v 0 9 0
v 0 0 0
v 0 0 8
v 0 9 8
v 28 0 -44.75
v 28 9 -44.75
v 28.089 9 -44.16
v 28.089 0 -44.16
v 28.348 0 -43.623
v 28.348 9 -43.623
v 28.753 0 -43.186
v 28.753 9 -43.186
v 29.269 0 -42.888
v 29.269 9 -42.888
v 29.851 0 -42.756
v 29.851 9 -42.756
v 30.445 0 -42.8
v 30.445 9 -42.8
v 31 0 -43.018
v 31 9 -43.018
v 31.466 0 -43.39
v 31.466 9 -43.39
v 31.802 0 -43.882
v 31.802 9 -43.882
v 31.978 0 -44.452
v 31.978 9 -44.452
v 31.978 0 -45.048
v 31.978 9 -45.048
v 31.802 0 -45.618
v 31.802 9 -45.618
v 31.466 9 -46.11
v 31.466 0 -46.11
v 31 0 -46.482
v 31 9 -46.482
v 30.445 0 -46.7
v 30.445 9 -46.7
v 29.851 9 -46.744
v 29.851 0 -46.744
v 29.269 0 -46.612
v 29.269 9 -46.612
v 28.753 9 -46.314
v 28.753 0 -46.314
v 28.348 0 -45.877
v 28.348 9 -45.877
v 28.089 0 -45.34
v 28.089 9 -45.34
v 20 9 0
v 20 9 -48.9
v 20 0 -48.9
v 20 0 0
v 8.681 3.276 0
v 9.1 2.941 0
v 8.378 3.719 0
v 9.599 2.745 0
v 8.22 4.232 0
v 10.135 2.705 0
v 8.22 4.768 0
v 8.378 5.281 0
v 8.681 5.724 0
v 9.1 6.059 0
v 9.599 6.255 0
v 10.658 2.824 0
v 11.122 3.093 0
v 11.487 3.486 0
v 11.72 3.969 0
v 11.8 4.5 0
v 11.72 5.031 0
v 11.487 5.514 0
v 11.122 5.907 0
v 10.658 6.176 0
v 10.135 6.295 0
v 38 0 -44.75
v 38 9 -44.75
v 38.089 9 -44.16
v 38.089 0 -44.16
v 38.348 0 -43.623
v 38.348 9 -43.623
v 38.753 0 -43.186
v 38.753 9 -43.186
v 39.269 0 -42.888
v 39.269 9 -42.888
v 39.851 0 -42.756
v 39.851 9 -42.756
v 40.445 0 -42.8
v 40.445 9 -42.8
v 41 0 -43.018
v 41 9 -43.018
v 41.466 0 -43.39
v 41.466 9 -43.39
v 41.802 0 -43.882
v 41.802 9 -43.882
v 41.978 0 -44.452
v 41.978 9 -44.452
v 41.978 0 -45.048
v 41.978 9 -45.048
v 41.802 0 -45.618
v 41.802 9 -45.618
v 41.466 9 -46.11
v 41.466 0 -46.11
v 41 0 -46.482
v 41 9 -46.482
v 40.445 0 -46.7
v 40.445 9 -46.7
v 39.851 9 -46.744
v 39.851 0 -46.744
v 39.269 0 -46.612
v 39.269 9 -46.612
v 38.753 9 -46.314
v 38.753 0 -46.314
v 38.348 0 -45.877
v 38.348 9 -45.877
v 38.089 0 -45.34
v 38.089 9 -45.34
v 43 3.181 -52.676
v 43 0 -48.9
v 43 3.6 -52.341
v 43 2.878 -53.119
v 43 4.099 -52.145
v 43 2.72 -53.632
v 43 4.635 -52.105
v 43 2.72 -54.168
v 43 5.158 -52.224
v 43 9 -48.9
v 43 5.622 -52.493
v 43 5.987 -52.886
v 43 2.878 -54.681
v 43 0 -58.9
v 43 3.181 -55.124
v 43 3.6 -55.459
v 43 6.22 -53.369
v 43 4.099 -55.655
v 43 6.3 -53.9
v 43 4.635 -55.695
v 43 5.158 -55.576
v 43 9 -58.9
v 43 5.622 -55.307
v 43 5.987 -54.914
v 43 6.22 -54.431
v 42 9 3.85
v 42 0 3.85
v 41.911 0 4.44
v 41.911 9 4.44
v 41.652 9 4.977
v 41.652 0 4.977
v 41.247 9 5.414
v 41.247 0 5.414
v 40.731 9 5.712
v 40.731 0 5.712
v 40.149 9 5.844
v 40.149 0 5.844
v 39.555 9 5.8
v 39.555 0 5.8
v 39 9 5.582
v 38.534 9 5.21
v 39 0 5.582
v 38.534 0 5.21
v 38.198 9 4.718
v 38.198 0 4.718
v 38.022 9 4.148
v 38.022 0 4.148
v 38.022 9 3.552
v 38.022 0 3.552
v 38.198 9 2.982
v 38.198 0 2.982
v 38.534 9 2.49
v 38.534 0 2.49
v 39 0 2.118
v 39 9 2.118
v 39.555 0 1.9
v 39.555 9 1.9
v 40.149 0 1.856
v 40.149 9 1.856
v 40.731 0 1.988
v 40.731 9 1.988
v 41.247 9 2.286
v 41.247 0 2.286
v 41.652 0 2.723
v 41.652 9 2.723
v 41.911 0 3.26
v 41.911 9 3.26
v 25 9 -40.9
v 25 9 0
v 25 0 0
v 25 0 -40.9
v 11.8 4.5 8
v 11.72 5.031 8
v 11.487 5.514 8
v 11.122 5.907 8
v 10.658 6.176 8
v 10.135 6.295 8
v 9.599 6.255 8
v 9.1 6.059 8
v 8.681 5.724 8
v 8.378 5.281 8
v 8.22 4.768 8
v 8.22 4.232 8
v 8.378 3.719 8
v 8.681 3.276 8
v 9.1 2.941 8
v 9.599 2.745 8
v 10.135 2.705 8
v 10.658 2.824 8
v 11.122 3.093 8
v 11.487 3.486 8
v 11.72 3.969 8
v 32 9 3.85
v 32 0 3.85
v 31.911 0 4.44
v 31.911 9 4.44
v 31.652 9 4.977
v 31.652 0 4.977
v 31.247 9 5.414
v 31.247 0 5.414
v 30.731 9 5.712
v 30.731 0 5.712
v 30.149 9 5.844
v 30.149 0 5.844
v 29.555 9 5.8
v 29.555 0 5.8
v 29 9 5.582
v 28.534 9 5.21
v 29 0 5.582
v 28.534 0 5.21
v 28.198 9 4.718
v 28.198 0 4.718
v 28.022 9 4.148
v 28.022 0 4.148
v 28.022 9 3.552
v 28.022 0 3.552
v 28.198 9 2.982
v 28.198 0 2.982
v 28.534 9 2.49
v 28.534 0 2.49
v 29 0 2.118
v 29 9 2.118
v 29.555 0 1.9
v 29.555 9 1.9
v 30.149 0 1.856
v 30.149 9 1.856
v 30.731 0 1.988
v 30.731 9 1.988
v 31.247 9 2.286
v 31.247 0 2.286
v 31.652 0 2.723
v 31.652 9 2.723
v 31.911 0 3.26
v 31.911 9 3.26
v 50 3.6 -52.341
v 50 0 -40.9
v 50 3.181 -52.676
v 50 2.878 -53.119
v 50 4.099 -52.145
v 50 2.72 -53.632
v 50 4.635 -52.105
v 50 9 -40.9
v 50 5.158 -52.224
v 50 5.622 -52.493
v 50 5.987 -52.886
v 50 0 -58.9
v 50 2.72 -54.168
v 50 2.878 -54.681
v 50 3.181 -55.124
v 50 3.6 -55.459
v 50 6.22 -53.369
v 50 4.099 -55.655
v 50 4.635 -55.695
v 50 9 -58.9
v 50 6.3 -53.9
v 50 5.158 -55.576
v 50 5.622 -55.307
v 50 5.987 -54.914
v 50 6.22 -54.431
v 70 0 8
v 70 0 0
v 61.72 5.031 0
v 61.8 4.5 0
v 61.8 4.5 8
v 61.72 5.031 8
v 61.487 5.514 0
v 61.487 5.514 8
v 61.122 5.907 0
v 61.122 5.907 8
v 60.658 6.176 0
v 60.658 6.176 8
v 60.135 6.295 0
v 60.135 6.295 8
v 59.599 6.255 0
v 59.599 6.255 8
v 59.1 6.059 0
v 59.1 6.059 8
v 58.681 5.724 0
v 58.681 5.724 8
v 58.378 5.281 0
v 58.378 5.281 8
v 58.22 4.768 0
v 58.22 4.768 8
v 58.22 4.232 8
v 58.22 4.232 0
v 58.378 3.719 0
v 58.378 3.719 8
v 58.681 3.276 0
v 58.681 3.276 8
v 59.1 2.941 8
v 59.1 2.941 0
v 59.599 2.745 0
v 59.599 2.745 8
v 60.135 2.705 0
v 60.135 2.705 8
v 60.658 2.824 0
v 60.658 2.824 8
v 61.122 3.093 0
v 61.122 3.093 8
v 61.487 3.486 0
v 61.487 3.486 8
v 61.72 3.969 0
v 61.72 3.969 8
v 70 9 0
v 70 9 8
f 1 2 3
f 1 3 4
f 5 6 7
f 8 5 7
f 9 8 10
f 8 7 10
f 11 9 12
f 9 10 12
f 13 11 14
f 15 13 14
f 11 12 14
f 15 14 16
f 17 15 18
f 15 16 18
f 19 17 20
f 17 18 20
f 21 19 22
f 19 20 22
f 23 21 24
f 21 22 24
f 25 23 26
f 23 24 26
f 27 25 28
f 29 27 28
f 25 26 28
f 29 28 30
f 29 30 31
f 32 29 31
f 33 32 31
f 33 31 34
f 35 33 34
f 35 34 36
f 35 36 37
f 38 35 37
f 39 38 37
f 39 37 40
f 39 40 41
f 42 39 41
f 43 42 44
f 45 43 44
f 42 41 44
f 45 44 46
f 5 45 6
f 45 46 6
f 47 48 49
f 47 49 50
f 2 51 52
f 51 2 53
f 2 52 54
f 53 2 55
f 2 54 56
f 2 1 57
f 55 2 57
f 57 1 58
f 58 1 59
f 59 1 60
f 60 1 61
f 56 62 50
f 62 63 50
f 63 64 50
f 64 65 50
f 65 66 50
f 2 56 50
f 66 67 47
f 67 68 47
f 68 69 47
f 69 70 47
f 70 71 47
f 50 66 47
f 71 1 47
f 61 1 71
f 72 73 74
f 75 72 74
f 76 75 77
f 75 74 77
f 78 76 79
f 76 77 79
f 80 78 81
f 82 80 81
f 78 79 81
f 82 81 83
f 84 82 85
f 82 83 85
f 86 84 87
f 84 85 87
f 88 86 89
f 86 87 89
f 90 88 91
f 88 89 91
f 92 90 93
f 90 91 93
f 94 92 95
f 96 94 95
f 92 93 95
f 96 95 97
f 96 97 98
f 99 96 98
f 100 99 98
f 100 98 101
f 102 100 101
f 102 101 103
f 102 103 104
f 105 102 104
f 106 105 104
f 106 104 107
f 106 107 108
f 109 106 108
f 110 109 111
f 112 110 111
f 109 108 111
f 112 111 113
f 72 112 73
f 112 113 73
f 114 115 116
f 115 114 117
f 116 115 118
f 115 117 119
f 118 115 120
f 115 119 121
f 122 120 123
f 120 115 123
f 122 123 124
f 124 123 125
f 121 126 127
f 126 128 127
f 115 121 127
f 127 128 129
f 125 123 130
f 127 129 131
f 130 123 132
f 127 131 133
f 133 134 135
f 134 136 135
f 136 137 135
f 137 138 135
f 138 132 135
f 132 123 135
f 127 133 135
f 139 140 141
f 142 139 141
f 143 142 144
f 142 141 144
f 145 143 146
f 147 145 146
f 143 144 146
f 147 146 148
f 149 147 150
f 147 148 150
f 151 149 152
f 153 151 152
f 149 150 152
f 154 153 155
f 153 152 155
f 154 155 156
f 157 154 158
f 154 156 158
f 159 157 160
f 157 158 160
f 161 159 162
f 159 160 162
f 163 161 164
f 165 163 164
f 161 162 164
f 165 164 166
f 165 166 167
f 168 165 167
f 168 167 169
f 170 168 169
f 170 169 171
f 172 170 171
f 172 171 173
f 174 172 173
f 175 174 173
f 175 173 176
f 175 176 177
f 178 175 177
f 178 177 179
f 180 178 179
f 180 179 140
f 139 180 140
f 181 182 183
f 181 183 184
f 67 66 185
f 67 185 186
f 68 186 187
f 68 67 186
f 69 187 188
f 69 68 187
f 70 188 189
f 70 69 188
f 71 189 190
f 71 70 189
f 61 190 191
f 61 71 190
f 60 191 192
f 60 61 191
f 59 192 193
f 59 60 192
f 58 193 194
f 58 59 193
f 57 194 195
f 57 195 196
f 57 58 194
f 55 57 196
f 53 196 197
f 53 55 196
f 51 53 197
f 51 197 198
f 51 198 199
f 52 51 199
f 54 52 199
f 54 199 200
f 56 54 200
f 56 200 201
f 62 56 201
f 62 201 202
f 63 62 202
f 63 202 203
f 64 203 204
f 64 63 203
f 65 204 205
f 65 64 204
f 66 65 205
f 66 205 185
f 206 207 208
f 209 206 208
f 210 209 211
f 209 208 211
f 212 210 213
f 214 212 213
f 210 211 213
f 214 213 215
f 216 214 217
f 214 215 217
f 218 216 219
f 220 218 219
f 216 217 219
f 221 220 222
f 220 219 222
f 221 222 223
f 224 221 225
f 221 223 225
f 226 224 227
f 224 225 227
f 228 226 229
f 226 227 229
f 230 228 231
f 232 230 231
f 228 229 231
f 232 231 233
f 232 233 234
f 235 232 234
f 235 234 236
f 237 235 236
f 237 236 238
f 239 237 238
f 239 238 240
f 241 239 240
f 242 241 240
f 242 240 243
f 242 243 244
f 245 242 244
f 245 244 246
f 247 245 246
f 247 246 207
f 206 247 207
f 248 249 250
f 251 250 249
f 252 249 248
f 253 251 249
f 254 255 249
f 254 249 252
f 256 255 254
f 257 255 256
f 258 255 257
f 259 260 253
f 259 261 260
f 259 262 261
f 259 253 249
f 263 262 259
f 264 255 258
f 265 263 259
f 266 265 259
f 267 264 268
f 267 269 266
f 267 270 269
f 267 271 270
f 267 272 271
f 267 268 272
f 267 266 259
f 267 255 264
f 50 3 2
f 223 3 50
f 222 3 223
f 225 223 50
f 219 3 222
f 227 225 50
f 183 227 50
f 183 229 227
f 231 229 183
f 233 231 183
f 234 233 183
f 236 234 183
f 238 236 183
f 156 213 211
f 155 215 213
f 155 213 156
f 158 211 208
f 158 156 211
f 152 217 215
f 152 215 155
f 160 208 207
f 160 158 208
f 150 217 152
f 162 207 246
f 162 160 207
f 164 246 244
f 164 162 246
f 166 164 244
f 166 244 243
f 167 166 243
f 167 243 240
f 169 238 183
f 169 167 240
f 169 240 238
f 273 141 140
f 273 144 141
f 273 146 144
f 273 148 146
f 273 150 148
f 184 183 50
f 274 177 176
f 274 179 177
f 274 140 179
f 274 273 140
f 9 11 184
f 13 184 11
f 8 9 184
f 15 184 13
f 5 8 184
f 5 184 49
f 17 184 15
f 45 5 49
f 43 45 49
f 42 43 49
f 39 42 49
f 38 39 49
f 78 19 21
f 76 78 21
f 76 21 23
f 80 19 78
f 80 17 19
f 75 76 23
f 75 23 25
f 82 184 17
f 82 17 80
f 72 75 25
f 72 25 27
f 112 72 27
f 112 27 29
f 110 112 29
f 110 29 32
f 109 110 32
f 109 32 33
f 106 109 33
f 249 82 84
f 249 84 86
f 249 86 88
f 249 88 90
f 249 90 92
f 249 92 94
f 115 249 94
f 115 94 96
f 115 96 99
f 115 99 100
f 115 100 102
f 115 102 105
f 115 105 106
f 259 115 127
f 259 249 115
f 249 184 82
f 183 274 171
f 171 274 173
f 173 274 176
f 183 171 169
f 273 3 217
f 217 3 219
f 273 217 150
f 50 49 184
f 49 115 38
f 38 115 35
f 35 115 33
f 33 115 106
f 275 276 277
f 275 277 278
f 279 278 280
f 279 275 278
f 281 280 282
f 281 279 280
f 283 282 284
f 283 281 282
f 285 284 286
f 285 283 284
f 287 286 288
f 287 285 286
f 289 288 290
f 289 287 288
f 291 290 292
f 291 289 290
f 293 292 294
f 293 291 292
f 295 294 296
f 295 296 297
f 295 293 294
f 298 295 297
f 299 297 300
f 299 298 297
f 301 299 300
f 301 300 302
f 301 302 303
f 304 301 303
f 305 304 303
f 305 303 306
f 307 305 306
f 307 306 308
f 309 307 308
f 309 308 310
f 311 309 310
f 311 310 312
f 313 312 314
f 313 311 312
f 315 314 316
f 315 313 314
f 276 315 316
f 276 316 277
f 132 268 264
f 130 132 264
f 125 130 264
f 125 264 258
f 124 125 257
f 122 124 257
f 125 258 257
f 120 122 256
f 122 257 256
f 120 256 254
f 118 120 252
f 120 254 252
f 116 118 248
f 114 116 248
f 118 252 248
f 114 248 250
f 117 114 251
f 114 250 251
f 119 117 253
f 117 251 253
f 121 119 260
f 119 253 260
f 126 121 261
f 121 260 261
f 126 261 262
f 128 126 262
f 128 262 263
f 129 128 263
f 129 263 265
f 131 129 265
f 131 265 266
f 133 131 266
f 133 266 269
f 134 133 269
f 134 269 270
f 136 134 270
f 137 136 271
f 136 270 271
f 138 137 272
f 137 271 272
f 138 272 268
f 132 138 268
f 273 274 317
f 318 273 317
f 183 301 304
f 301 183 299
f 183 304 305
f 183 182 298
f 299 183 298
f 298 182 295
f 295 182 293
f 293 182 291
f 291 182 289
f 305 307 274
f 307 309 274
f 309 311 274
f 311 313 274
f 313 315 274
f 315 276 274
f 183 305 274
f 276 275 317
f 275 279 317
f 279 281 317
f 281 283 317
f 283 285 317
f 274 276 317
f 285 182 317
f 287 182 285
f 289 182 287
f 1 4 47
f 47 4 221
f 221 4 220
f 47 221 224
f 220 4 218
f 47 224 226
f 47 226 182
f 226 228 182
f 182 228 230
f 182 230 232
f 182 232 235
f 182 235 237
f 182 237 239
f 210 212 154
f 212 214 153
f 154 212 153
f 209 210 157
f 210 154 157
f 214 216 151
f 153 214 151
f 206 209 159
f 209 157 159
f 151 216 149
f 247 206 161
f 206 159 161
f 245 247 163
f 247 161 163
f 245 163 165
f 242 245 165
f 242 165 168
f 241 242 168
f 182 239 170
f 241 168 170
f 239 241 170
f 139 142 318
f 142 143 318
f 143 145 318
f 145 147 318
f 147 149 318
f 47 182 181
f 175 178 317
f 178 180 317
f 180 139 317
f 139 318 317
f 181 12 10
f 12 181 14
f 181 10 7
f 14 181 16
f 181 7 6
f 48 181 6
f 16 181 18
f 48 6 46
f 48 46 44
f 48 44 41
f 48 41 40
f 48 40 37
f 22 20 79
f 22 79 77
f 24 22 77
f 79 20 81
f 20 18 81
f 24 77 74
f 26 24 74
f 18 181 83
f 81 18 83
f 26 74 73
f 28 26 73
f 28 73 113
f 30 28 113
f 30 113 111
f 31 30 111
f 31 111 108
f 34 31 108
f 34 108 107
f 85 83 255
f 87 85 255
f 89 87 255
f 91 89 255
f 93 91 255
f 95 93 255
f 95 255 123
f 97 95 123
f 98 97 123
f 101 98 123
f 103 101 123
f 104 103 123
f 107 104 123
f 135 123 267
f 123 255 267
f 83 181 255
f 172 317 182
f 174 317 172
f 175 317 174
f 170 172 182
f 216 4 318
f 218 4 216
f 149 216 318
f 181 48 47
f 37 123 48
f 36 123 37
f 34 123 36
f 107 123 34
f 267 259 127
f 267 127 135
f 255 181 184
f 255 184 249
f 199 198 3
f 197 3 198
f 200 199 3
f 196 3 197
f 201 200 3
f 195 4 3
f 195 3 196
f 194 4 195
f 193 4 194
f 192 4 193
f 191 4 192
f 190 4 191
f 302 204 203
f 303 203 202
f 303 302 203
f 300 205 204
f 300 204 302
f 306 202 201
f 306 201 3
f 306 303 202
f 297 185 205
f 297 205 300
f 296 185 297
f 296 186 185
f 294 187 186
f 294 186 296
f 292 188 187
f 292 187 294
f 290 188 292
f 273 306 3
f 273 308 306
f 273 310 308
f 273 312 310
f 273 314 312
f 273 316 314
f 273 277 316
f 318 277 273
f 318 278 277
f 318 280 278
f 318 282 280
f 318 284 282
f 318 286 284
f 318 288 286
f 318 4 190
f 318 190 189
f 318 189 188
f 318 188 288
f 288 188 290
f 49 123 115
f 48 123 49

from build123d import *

# Parameters (mm, degrees)
ESQUISSE1_W             = 70
ESQUISSE1_H             = 9
ESQUISSE1_R             = 1.8
BOSS_EXTRU_1_DEPTH      = 8
ESQUISSE2_R             = 2
ENL_V_MAT_EXTRU_1_DEPTH = 10
ESQUISSE3_R             = 2
BOSS_EXTRU_2_DEPTH      = 9
ESQUISSE4_W             = 5
ESQUISSE4_H             = 48.9
ENL_V_MAT_EXTRU_2_DEPTH = 10
ESQUISSE5_W             = 10
ESQUISSE5_H             = 9
ESQUISSE5_R             = 1.8
BOSS_EXTRU_3_DEPTH      = 7


with BuildPart() as part:
    # Esquisse1 → Boss.-Extru.1 (new body)
    with BuildSketch(Plane.XY):
        with Locations((35, 4.5)):
            Rectangle(ESQUISSE1_W, ESQUISSE1_H)
        with Locations((10, 4.5)):
            Circle(ESQUISSE1_R, mode=Mode.SUBTRACT)
        with Locations((60, 4.5)):
            Circle(ESQUISSE1_R, mode=Mode.SUBTRACT)
    extrude(amount=BOSS_EXTRU_1_DEPTH)

    # Esquisse2 → Enlèv. mat.-Extru.1 (cut)
    with BuildSketch(Plane.XZ):
        with Locations((30, 3.85)):
            Circle(ESQUISSE2_R)
        with Locations((40, 3.85)):
            Circle(ESQUISSE2_R)
    extrude(amount=-ENL_V_MAT_EXTRU_1_DEPTH, mode=Mode.SUBTRACT)

    # Esquisse3 → Boss.-Extru.2 (add)
    with BuildSketch(Plane(origin=(0, 9, 0), x_dir=(1, 0, 0), z_dir=(0, 1, 0))):
        Polygon((50, 0), (55, 0), (55, 48.9), (20, 48.9), (20, 0), (25, 0), (25, 40.9), (50, 40.9), align=None)
        with Locations(Location((30, 44.75, 0), (0, 0, 180))):
            Circle(ESQUISSE3_R, mode=Mode.SUBTRACT)
        with Locations(Location((40, 44.75, 0), (0, 0, 180))):
            Circle(ESQUISSE3_R, mode=Mode.SUBTRACT)
    extrude(amount=-BOSS_EXTRU_2_DEPTH)

    # Esquisse4 → Enlèv. mat.-Extru.2 (cut)
    with BuildSketch(Plane(origin=(0, 9, 0), x_dir=(1, 0, 0), z_dir=(0, 1, 0))):
        with Locations((52.5, 24.45)):
            Rectangle(ESQUISSE4_W, ESQUISSE4_H)
    extrude(amount=-ENL_V_MAT_EXTRU_2_DEPTH, mode=Mode.SUBTRACT)

    # Esquisse5 → Boss.-Extru.3 (add)
    with BuildSketch(Plane(origin=(50, 0, 0), x_dir=(0, 0, -1), z_dir=(1, 0, 0))):
        with Locations((53.9, 4.5)):
            Rectangle(ESQUISSE5_W, ESQUISSE5_H)
        with Locations(Location((53.9, 4.5, 0), (0, 0, 90))):
            Circle(ESQUISSE5_R, mode=Mode.SUBTRACT)
    extrude(amount=-BOSS_EXTRU_3_DEPTH)


solid = part.part
